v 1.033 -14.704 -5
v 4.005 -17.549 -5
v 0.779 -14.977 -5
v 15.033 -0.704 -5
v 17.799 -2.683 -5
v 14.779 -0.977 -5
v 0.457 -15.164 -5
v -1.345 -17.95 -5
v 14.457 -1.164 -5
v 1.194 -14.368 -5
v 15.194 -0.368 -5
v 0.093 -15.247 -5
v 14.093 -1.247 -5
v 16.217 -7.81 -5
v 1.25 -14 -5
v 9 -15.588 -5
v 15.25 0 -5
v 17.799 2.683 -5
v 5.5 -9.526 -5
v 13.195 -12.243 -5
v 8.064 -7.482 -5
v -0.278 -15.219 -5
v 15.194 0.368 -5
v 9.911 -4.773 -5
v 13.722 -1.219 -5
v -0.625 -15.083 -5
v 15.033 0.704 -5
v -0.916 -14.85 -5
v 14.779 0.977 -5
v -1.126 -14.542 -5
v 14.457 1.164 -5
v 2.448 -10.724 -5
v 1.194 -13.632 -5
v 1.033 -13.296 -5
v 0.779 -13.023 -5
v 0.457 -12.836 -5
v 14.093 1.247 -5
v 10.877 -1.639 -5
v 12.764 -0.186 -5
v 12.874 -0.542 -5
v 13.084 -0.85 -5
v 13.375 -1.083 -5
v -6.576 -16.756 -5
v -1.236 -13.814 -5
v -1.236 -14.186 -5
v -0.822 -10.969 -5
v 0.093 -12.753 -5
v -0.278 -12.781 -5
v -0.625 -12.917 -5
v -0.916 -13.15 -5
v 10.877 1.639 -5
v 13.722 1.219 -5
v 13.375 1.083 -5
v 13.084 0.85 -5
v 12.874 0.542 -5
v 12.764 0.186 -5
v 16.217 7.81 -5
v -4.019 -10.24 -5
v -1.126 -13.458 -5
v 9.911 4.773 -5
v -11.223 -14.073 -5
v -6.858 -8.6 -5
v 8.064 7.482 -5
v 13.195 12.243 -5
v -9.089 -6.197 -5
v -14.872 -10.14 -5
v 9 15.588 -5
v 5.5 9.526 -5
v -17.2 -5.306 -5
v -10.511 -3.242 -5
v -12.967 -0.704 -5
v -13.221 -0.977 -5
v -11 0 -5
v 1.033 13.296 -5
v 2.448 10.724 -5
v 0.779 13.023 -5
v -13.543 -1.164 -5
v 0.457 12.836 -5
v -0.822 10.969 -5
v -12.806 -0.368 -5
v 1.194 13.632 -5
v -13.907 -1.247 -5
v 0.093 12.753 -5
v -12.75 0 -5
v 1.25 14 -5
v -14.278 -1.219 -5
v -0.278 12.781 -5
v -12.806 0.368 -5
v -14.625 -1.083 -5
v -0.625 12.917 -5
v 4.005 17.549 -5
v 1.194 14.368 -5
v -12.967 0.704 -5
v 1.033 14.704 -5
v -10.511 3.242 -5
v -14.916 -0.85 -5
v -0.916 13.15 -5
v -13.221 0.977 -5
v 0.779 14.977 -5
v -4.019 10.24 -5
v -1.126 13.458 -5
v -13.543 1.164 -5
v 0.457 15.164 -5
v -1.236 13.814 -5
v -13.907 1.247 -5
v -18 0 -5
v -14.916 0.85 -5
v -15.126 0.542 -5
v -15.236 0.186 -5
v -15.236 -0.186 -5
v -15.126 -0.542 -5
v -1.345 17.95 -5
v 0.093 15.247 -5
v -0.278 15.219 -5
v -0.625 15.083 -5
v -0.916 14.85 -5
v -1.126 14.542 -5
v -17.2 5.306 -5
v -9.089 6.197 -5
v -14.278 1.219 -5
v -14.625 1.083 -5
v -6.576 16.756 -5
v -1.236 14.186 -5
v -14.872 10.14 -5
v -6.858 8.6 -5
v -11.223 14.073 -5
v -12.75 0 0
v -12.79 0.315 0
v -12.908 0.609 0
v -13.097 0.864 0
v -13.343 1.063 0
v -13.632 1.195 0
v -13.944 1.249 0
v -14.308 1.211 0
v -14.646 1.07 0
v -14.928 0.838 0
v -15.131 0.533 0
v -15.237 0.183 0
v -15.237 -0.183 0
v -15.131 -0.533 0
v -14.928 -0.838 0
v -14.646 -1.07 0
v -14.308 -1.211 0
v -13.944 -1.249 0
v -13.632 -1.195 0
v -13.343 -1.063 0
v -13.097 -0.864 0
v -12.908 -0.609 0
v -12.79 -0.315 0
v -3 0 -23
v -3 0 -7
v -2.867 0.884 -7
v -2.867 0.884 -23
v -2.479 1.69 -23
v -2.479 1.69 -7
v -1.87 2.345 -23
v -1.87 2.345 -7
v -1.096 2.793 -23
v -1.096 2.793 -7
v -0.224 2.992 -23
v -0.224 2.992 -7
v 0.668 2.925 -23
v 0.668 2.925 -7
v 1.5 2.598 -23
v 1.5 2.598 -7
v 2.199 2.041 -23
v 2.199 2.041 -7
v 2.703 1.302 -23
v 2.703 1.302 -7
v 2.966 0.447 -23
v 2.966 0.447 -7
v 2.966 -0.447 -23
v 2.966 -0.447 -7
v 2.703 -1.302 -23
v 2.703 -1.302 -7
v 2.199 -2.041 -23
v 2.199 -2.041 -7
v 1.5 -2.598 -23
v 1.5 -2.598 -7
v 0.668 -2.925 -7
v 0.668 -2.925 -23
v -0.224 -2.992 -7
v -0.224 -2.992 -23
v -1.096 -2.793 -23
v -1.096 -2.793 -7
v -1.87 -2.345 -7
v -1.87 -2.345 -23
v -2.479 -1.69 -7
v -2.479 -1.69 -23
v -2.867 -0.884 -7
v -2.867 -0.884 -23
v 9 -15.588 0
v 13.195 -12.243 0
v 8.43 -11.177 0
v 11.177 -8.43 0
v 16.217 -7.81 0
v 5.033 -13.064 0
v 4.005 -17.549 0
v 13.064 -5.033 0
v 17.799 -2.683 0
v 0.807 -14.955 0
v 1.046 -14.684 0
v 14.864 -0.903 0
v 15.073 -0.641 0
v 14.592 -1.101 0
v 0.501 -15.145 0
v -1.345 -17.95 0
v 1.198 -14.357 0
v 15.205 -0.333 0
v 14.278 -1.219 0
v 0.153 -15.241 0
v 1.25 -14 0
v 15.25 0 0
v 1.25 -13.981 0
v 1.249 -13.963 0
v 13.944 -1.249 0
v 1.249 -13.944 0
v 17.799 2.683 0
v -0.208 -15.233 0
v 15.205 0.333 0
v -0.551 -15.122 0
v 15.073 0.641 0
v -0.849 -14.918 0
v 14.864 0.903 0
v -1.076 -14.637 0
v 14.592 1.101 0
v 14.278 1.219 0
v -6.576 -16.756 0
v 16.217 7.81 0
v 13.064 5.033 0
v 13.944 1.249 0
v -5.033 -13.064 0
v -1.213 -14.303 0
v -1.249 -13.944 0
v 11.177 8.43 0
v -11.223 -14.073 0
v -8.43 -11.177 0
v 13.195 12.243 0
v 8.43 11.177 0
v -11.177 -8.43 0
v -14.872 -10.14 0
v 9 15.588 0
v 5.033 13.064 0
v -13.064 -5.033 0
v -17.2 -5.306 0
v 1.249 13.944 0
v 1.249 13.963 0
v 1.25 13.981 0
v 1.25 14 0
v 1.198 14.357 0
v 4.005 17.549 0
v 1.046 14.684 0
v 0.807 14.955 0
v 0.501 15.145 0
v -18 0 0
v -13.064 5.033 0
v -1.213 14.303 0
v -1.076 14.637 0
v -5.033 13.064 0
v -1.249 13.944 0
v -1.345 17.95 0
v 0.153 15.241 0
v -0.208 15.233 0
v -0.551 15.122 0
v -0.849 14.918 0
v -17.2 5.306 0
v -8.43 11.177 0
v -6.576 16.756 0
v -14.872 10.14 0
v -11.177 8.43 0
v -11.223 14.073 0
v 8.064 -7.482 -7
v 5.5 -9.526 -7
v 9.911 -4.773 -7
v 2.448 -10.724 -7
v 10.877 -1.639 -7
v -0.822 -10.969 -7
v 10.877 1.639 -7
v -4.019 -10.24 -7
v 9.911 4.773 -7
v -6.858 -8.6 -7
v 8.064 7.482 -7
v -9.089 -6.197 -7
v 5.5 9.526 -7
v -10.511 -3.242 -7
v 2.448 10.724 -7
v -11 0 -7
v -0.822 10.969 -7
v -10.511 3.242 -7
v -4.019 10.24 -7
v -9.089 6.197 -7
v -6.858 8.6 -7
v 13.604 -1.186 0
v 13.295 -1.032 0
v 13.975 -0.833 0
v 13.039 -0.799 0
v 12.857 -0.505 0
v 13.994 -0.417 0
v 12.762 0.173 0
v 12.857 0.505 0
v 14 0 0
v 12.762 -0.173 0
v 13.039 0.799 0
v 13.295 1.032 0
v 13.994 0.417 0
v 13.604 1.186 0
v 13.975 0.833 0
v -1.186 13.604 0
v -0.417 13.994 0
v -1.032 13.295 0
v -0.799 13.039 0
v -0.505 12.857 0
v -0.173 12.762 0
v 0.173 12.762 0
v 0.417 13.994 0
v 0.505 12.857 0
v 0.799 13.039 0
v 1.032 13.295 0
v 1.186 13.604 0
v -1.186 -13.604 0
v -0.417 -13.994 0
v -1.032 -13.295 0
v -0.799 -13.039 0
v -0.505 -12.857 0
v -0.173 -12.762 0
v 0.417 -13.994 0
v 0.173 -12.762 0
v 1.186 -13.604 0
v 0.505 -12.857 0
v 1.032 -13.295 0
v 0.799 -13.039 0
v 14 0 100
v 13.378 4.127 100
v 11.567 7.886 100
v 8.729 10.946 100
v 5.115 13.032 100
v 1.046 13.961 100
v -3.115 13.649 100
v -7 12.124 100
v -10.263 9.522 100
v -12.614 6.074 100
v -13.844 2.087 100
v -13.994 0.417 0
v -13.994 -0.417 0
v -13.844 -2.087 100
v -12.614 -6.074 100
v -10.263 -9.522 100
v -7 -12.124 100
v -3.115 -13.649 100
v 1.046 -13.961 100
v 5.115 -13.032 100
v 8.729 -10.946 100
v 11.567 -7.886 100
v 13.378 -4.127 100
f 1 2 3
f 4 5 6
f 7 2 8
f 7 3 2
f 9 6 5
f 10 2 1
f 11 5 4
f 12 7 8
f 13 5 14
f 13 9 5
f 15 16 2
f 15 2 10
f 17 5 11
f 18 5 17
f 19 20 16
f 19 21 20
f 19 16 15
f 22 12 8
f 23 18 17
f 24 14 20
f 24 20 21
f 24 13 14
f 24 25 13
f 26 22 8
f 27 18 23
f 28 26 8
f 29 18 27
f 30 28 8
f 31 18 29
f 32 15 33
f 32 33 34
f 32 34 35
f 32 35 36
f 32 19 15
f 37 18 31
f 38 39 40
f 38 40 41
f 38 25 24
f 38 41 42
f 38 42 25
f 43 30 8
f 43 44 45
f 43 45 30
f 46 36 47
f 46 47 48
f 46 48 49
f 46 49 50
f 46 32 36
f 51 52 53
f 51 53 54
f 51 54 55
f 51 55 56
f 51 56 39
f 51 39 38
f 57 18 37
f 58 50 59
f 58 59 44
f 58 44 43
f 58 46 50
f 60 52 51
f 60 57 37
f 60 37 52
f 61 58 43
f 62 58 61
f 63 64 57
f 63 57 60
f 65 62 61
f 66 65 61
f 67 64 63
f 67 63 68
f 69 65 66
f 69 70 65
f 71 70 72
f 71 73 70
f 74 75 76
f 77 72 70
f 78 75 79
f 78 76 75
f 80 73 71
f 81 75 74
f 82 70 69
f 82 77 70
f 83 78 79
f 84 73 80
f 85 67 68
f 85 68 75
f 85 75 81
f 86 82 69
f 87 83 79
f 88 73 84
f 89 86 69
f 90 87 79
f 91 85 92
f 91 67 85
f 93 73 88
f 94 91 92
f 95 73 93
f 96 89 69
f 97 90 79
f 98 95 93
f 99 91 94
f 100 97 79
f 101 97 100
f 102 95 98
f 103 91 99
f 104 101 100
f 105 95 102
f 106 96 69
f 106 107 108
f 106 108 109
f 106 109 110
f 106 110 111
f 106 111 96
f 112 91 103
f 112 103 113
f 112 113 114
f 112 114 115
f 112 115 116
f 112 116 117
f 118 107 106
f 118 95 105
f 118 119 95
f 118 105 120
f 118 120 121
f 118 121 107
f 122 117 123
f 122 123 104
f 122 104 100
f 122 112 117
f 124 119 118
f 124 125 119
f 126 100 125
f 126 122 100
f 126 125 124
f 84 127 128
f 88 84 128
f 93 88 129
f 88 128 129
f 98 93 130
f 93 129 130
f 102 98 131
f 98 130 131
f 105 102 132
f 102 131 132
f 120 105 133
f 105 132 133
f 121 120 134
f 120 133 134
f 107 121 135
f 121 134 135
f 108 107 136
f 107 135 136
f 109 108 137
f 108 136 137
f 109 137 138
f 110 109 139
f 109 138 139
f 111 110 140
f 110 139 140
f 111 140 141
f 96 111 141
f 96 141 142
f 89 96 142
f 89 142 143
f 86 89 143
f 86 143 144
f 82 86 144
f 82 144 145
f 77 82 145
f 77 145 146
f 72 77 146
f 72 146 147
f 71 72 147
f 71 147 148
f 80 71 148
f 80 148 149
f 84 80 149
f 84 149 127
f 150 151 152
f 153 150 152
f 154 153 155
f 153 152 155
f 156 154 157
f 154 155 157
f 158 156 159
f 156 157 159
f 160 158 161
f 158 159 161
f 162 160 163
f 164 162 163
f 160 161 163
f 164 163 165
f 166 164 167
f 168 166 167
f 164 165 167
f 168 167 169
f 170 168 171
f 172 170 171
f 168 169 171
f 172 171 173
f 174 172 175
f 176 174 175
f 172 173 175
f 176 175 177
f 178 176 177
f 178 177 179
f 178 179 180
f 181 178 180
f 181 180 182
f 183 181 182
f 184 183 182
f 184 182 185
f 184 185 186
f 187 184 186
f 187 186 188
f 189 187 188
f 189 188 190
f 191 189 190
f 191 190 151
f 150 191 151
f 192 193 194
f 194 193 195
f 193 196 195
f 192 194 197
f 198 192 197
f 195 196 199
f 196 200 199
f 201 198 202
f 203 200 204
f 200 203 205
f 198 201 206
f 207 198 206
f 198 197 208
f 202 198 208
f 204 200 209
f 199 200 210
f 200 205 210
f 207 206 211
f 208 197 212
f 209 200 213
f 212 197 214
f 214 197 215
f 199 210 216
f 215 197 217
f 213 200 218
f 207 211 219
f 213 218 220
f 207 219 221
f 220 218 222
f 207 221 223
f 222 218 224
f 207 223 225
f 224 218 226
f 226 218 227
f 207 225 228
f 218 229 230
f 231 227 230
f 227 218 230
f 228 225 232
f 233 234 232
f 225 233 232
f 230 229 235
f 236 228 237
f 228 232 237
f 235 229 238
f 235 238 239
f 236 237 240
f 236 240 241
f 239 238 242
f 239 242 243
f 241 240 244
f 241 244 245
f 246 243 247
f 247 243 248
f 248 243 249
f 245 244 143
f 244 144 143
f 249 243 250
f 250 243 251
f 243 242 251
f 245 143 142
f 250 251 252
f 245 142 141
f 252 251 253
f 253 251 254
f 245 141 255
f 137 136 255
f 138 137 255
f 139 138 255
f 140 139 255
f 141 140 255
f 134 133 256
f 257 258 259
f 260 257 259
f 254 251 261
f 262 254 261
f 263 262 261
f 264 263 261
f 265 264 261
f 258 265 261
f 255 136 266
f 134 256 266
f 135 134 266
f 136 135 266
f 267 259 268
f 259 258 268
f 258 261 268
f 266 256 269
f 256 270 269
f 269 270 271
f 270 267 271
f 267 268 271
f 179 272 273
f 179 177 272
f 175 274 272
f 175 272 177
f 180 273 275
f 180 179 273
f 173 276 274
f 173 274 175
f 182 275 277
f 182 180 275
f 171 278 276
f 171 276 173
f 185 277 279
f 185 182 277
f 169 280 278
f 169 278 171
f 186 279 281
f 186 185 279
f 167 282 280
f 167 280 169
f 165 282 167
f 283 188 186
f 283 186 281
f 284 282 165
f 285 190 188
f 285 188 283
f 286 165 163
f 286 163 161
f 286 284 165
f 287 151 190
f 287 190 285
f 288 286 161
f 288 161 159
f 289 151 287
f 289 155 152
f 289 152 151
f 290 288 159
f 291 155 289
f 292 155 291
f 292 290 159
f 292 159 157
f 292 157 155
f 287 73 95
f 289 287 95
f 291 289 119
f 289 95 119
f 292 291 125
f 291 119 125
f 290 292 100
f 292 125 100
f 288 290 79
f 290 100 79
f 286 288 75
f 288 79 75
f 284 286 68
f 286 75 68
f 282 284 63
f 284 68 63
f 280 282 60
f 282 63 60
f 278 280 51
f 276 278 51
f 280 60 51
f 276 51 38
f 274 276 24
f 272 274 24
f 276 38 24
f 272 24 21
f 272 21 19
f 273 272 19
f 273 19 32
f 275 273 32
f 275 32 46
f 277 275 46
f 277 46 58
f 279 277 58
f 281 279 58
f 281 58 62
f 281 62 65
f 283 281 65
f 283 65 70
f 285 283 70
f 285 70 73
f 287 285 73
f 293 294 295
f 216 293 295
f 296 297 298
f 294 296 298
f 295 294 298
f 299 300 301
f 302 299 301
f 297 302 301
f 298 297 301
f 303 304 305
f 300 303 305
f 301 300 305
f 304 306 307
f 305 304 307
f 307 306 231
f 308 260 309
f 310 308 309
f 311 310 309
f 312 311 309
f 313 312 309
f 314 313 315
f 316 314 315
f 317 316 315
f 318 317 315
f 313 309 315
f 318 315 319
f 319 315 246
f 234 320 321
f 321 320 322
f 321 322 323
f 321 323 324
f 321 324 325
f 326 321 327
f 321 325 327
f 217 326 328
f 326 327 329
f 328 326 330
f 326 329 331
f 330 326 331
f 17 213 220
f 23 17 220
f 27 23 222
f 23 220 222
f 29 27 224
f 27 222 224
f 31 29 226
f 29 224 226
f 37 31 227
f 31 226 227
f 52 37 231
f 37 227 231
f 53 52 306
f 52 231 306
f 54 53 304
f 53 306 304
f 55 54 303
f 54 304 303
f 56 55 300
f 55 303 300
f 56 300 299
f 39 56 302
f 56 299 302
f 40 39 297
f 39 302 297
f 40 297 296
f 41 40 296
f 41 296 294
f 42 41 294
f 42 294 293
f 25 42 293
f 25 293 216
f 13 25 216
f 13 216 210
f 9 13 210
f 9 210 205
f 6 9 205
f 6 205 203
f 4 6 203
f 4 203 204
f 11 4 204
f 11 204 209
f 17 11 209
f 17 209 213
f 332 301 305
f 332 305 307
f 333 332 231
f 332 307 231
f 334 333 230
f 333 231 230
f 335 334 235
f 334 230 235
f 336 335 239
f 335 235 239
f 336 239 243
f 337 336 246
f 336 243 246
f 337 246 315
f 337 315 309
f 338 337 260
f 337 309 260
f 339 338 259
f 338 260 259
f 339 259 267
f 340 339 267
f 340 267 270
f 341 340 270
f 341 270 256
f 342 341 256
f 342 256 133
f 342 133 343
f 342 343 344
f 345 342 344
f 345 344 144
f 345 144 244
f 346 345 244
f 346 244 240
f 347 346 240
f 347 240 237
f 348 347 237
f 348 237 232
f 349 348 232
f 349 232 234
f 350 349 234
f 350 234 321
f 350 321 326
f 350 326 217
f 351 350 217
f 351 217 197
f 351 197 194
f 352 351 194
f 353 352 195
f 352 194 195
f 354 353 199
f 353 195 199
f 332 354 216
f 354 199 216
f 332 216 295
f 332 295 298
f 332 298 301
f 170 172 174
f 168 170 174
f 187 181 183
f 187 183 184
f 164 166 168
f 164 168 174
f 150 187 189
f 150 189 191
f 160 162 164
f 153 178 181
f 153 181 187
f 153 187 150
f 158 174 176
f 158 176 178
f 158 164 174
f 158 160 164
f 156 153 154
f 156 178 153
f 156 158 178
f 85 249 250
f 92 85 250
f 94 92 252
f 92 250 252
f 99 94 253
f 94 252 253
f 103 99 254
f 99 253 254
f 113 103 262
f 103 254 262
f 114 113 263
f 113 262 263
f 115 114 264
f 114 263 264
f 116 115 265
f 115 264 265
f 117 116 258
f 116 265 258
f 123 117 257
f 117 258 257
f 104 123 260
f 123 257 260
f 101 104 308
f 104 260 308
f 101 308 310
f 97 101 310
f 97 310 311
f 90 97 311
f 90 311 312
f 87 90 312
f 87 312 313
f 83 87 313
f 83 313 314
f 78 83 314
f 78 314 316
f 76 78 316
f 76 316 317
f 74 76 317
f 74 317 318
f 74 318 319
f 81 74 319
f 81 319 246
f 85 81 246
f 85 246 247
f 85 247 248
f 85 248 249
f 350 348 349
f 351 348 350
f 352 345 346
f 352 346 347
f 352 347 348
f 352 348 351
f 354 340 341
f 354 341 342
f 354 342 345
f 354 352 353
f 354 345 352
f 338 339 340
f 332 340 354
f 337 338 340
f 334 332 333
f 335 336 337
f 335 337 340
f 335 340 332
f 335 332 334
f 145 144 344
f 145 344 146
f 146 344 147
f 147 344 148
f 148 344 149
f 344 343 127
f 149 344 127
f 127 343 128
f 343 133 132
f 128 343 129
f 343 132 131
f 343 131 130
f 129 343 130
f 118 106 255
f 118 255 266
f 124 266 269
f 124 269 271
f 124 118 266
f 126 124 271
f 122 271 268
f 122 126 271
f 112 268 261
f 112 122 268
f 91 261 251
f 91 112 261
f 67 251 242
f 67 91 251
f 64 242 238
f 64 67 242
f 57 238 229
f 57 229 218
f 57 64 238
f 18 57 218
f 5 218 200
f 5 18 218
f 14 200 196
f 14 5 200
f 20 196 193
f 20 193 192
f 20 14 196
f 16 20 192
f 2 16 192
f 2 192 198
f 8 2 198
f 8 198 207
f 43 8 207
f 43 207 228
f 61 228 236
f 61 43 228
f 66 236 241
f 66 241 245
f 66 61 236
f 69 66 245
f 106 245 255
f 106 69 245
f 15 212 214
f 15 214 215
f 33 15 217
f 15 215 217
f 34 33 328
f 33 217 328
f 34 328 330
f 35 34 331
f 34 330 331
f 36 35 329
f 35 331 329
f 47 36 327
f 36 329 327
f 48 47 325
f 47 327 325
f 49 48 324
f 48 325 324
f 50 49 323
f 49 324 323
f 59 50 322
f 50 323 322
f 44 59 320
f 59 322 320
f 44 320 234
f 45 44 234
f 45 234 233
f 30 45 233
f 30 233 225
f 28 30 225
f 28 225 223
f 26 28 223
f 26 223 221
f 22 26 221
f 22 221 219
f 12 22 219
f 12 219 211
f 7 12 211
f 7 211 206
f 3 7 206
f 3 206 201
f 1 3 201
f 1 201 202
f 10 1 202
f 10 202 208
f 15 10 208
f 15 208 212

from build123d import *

# Parameters (mm, degrees)
SKETCH1_R                 = 14
BOSS_EXTRUDE1_DEPTH       = 100
SKETCH2_R                 = 11
SKETCH2_R_2               = 3
BOSS_EXTRUDE2_DEPTH       = 7
SKETCH2_3_R               = 3
BOSS_EXTRUDE3_DEPTH       = 23
BOSS_EXTRUDE4_START       = 5
SKETCH2_4_R               = 18
SKETCH2_4_R_2             = 14
SKETCH2_4_R_3             = 11
BOSS_EXTRUDE4_DEPTH       = 5
M3X0_5_TAPPED_HOLE1_D     = 2.5
M3X0_5_TAPPED_HOLE1_DEPTH = 5


with BuildPart() as part:
    # Sketch1 → Boss-Extrude1 (new body)
    with BuildSketch(Plane.XY):
        Circle(SKETCH1_R)
    extrude(amount=BOSS_EXTRUDE1_DEPTH)

    # Sketch2 → Boss-Extrude2 (add)
    # profile 1 of 2: a face of its own
    with BuildSketch(Plane(origin=(0, 0, 0), x_dir=(-1, 0, 0), z_dir=(0, 0, -1))):
        Circle(SKETCH2_R)
        Circle(SKETCH2_R_2, mode=Mode.SUBTRACT)
    # profile 2 of 2: a face of its own
    with BuildSketch(Plane(origin=(0, 0, 0), x_dir=(-1, 0, 0), z_dir=(0, 0, -1))):
        Circle(SKETCH2_R_2)
    extrude(amount=BOSS_EXTRUDE2_DEPTH)

    # Sketch2<3> → Boss-Extrude3 (add)
    with BuildSketch(Plane(origin=(0, 0, 0), x_dir=(-1, 0, 0), z_dir=(0, 0, -1))):
        Circle(SKETCH2_3_R)
    extrude(amount=BOSS_EXTRUDE3_DEPTH)

    # Sketch2<4> → Boss-Extrude4 (add)
    # profile 1 of 2: a face of its own
    with BuildSketch(Plane(origin=(0, 0, 0), x_dir=(-1, 0, 0), z_dir=(0, 0, -1)).offset(BOSS_EXTRUDE4_START)):
        Circle(SKETCH2_4_R)
        Circle(SKETCH2_4_R_2, mode=Mode.SUBTRACT)
    # profile 2 of 2: a face of its own
    with BuildSketch(Plane(origin=(0, 0, 0), x_dir=(-1, 0, 0), z_dir=(0, 0, -1)).offset(BOSS_EXTRUDE4_START)):
        Circle(SKETCH2_4_R_2)
        Circle(SKETCH2_4_R_3, mode=Mode.SUBTRACT)
    extrude(amount=-BOSS_EXTRUDE4_DEPTH)

    # M3x0.5 Tapped Hole1
    with Locations(Plane(origin=(0, 0, -5), x_dir=(-1, 0, 0), z_dir=(0, 0, -1))):
        with Locations((0, 14), (14, 0), (0, -14), (-14, 0)):
            Hole(M3X0_5_TAPPED_HOLE1_D / 2, depth=M3X0_5_TAPPED_HOLE1_DEPTH)


solid = part.part
